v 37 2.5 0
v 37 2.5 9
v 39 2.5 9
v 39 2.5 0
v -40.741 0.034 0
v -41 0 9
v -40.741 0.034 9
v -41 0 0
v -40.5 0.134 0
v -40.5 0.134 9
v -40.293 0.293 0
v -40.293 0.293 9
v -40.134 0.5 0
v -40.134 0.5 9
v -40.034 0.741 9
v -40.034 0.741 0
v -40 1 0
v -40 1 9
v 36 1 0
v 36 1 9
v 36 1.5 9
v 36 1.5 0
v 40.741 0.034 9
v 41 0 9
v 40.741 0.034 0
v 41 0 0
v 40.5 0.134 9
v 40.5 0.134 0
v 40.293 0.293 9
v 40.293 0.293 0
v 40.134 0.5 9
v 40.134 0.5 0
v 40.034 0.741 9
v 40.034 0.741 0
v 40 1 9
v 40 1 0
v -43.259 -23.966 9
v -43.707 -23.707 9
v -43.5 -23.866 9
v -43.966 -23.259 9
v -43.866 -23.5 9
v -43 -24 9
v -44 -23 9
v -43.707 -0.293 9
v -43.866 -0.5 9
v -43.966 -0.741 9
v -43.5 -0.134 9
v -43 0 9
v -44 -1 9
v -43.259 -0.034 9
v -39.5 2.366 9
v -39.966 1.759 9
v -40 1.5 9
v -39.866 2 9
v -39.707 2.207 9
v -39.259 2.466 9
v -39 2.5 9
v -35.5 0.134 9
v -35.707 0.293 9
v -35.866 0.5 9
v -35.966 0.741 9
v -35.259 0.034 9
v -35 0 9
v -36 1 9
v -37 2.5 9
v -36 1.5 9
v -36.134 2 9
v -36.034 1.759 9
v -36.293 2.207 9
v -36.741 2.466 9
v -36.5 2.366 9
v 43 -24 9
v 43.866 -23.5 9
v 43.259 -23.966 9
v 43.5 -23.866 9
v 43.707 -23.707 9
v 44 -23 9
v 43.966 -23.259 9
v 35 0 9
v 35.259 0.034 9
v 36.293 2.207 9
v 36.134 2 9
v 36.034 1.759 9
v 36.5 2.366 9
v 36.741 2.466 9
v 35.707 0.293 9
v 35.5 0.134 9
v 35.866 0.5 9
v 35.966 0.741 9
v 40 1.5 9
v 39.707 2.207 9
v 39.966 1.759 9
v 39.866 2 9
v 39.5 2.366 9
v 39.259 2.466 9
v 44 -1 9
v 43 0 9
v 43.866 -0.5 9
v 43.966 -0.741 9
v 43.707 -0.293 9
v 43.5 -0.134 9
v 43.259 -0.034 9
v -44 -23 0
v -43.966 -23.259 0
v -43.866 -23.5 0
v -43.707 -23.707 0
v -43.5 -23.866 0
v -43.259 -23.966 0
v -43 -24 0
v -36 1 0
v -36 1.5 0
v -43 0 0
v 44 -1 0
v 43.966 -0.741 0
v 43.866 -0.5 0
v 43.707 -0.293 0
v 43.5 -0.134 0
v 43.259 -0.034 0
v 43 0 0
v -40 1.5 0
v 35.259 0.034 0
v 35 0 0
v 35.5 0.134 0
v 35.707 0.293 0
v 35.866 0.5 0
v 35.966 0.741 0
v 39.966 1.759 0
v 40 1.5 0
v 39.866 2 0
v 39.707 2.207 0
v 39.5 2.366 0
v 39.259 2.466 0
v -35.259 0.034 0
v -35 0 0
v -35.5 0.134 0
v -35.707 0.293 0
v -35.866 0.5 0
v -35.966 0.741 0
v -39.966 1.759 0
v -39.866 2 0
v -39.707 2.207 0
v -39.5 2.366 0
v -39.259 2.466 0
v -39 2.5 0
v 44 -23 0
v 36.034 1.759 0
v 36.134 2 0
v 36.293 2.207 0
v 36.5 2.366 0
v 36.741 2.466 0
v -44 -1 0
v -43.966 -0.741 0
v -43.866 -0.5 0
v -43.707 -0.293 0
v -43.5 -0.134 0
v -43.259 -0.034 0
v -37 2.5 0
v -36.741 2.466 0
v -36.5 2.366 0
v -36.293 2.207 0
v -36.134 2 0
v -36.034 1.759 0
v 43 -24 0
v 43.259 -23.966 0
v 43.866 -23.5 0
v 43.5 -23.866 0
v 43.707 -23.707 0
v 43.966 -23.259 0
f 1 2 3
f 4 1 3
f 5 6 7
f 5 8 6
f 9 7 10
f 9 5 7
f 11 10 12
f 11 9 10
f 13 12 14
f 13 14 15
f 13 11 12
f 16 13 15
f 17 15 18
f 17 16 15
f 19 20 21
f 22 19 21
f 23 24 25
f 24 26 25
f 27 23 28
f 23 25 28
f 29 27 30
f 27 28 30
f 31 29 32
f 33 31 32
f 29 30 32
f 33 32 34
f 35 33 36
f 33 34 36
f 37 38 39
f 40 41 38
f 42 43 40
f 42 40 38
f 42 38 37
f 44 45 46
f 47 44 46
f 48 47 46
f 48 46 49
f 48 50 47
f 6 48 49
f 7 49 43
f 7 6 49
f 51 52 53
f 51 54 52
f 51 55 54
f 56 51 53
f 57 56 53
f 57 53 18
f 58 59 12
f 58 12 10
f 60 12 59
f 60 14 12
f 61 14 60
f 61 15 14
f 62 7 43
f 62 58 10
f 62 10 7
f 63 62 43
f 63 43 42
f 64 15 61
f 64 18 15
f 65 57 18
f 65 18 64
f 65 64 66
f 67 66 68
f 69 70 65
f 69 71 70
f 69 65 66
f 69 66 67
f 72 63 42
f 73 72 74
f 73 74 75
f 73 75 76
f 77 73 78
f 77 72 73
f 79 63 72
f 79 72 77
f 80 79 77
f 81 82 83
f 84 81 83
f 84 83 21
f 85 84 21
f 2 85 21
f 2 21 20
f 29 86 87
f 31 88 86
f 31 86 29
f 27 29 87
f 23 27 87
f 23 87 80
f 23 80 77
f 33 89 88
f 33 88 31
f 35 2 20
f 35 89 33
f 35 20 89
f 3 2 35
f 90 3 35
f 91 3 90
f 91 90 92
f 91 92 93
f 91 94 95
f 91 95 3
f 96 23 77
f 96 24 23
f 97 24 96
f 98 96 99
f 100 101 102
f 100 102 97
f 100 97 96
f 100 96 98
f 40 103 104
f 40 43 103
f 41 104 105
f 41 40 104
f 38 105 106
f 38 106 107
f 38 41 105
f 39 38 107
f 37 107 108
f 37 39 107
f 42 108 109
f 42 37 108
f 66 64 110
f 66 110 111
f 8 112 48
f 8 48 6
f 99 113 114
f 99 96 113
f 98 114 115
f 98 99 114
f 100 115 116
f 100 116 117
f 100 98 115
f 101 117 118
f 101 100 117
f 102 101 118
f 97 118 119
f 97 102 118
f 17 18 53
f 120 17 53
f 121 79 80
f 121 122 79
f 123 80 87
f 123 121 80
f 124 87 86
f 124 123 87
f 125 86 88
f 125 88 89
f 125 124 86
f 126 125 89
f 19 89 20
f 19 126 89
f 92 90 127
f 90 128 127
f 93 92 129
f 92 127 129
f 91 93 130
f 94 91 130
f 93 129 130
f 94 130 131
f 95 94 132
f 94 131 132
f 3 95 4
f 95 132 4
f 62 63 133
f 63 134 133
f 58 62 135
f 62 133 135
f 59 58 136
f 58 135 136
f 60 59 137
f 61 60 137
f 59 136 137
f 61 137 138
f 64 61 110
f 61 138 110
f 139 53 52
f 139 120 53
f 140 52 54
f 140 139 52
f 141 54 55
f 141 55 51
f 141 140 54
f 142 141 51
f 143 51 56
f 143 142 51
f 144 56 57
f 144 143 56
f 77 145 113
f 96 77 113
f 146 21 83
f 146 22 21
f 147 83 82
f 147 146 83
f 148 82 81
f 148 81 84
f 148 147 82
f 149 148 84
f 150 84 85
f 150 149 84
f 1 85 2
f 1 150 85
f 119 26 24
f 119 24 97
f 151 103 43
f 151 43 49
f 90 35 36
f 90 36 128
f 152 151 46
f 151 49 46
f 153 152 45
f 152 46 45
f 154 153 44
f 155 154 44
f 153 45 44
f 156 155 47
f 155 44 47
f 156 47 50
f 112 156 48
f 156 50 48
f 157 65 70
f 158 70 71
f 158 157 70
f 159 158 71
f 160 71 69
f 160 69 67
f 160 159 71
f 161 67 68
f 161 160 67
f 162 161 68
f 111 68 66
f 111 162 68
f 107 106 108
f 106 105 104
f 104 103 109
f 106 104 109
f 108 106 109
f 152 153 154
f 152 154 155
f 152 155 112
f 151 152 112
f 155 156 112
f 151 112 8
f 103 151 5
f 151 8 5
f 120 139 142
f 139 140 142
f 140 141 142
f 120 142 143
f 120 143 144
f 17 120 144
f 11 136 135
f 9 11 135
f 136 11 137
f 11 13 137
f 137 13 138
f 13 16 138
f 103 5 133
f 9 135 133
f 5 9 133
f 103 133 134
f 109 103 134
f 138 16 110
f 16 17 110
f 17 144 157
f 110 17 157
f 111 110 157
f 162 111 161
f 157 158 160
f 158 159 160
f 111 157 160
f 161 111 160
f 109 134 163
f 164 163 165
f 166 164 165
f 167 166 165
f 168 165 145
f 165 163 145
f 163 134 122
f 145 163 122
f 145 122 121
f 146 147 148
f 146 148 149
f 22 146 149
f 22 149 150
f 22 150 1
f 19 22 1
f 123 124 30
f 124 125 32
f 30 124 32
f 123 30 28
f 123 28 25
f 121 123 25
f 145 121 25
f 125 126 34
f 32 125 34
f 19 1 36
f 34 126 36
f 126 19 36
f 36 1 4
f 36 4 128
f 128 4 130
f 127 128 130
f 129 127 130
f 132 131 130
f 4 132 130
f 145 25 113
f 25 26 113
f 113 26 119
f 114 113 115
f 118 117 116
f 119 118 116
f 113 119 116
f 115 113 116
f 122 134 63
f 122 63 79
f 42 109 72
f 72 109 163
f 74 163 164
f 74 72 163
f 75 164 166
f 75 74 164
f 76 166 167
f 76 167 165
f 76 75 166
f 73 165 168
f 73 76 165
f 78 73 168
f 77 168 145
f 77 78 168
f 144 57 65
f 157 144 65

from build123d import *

# Parameters (mm, degrees)
ESQUISSE1_W        = 88
ESQUISSE1_H        = 24
BOSS_EXTRU_1_DEPTH = 9
ESQUISSE2_W        = 4
ESQUISSE2_H        = 2.5
BOSS_EXTRU_2_DEPTH = 9
CONG_1_R           = 1


with BuildPart() as part:
    # Esquisse1 → Boss.-Extru.1 (new body)
    with BuildSketch(Plane.XY):
        with Locations((0, -12)):
            Rectangle(ESQUISSE1_W, ESQUISSE1_H)
    extrude(amount=BOSS_EXTRU_1_DEPTH)

    # Esquisse2 → Boss.-Extru.2 (add)
    with BuildSketch(Plane.XY.offset(9)):
        with Locations((-38, 1.25)):
            Rectangle(ESQUISSE2_W, ESQUISSE2_H)
        with Locations((38, 1.25)):
            Rectangle(ESQUISSE2_W, ESQUISSE2_H)
    extrude(amount=-BOSS_EXTRU_2_DEPTH)

    # Congé1
    cong_1_edges = [part.edges().sort_by_distance(p)[0] for p in [
        (-40, 2.5, 4.5),
        (-40, 0, 4.5),
        (-36, 0, 4.5),
        (-36, 2.5, 4.5),
        (40, 2.5, 4.5),
        (36, 2.5, 4.5),
        (36, 0, 4.5),
        (40, 0, 4.5),
        (-44, 0, 4.5),
        (44, 0, 4.5),
        (44, -24, 4.5),
        (-44, -24, 4.5),
    ]]
    fillet(cong_1_edges, radius=CONG_1_R)


solid = part.part
